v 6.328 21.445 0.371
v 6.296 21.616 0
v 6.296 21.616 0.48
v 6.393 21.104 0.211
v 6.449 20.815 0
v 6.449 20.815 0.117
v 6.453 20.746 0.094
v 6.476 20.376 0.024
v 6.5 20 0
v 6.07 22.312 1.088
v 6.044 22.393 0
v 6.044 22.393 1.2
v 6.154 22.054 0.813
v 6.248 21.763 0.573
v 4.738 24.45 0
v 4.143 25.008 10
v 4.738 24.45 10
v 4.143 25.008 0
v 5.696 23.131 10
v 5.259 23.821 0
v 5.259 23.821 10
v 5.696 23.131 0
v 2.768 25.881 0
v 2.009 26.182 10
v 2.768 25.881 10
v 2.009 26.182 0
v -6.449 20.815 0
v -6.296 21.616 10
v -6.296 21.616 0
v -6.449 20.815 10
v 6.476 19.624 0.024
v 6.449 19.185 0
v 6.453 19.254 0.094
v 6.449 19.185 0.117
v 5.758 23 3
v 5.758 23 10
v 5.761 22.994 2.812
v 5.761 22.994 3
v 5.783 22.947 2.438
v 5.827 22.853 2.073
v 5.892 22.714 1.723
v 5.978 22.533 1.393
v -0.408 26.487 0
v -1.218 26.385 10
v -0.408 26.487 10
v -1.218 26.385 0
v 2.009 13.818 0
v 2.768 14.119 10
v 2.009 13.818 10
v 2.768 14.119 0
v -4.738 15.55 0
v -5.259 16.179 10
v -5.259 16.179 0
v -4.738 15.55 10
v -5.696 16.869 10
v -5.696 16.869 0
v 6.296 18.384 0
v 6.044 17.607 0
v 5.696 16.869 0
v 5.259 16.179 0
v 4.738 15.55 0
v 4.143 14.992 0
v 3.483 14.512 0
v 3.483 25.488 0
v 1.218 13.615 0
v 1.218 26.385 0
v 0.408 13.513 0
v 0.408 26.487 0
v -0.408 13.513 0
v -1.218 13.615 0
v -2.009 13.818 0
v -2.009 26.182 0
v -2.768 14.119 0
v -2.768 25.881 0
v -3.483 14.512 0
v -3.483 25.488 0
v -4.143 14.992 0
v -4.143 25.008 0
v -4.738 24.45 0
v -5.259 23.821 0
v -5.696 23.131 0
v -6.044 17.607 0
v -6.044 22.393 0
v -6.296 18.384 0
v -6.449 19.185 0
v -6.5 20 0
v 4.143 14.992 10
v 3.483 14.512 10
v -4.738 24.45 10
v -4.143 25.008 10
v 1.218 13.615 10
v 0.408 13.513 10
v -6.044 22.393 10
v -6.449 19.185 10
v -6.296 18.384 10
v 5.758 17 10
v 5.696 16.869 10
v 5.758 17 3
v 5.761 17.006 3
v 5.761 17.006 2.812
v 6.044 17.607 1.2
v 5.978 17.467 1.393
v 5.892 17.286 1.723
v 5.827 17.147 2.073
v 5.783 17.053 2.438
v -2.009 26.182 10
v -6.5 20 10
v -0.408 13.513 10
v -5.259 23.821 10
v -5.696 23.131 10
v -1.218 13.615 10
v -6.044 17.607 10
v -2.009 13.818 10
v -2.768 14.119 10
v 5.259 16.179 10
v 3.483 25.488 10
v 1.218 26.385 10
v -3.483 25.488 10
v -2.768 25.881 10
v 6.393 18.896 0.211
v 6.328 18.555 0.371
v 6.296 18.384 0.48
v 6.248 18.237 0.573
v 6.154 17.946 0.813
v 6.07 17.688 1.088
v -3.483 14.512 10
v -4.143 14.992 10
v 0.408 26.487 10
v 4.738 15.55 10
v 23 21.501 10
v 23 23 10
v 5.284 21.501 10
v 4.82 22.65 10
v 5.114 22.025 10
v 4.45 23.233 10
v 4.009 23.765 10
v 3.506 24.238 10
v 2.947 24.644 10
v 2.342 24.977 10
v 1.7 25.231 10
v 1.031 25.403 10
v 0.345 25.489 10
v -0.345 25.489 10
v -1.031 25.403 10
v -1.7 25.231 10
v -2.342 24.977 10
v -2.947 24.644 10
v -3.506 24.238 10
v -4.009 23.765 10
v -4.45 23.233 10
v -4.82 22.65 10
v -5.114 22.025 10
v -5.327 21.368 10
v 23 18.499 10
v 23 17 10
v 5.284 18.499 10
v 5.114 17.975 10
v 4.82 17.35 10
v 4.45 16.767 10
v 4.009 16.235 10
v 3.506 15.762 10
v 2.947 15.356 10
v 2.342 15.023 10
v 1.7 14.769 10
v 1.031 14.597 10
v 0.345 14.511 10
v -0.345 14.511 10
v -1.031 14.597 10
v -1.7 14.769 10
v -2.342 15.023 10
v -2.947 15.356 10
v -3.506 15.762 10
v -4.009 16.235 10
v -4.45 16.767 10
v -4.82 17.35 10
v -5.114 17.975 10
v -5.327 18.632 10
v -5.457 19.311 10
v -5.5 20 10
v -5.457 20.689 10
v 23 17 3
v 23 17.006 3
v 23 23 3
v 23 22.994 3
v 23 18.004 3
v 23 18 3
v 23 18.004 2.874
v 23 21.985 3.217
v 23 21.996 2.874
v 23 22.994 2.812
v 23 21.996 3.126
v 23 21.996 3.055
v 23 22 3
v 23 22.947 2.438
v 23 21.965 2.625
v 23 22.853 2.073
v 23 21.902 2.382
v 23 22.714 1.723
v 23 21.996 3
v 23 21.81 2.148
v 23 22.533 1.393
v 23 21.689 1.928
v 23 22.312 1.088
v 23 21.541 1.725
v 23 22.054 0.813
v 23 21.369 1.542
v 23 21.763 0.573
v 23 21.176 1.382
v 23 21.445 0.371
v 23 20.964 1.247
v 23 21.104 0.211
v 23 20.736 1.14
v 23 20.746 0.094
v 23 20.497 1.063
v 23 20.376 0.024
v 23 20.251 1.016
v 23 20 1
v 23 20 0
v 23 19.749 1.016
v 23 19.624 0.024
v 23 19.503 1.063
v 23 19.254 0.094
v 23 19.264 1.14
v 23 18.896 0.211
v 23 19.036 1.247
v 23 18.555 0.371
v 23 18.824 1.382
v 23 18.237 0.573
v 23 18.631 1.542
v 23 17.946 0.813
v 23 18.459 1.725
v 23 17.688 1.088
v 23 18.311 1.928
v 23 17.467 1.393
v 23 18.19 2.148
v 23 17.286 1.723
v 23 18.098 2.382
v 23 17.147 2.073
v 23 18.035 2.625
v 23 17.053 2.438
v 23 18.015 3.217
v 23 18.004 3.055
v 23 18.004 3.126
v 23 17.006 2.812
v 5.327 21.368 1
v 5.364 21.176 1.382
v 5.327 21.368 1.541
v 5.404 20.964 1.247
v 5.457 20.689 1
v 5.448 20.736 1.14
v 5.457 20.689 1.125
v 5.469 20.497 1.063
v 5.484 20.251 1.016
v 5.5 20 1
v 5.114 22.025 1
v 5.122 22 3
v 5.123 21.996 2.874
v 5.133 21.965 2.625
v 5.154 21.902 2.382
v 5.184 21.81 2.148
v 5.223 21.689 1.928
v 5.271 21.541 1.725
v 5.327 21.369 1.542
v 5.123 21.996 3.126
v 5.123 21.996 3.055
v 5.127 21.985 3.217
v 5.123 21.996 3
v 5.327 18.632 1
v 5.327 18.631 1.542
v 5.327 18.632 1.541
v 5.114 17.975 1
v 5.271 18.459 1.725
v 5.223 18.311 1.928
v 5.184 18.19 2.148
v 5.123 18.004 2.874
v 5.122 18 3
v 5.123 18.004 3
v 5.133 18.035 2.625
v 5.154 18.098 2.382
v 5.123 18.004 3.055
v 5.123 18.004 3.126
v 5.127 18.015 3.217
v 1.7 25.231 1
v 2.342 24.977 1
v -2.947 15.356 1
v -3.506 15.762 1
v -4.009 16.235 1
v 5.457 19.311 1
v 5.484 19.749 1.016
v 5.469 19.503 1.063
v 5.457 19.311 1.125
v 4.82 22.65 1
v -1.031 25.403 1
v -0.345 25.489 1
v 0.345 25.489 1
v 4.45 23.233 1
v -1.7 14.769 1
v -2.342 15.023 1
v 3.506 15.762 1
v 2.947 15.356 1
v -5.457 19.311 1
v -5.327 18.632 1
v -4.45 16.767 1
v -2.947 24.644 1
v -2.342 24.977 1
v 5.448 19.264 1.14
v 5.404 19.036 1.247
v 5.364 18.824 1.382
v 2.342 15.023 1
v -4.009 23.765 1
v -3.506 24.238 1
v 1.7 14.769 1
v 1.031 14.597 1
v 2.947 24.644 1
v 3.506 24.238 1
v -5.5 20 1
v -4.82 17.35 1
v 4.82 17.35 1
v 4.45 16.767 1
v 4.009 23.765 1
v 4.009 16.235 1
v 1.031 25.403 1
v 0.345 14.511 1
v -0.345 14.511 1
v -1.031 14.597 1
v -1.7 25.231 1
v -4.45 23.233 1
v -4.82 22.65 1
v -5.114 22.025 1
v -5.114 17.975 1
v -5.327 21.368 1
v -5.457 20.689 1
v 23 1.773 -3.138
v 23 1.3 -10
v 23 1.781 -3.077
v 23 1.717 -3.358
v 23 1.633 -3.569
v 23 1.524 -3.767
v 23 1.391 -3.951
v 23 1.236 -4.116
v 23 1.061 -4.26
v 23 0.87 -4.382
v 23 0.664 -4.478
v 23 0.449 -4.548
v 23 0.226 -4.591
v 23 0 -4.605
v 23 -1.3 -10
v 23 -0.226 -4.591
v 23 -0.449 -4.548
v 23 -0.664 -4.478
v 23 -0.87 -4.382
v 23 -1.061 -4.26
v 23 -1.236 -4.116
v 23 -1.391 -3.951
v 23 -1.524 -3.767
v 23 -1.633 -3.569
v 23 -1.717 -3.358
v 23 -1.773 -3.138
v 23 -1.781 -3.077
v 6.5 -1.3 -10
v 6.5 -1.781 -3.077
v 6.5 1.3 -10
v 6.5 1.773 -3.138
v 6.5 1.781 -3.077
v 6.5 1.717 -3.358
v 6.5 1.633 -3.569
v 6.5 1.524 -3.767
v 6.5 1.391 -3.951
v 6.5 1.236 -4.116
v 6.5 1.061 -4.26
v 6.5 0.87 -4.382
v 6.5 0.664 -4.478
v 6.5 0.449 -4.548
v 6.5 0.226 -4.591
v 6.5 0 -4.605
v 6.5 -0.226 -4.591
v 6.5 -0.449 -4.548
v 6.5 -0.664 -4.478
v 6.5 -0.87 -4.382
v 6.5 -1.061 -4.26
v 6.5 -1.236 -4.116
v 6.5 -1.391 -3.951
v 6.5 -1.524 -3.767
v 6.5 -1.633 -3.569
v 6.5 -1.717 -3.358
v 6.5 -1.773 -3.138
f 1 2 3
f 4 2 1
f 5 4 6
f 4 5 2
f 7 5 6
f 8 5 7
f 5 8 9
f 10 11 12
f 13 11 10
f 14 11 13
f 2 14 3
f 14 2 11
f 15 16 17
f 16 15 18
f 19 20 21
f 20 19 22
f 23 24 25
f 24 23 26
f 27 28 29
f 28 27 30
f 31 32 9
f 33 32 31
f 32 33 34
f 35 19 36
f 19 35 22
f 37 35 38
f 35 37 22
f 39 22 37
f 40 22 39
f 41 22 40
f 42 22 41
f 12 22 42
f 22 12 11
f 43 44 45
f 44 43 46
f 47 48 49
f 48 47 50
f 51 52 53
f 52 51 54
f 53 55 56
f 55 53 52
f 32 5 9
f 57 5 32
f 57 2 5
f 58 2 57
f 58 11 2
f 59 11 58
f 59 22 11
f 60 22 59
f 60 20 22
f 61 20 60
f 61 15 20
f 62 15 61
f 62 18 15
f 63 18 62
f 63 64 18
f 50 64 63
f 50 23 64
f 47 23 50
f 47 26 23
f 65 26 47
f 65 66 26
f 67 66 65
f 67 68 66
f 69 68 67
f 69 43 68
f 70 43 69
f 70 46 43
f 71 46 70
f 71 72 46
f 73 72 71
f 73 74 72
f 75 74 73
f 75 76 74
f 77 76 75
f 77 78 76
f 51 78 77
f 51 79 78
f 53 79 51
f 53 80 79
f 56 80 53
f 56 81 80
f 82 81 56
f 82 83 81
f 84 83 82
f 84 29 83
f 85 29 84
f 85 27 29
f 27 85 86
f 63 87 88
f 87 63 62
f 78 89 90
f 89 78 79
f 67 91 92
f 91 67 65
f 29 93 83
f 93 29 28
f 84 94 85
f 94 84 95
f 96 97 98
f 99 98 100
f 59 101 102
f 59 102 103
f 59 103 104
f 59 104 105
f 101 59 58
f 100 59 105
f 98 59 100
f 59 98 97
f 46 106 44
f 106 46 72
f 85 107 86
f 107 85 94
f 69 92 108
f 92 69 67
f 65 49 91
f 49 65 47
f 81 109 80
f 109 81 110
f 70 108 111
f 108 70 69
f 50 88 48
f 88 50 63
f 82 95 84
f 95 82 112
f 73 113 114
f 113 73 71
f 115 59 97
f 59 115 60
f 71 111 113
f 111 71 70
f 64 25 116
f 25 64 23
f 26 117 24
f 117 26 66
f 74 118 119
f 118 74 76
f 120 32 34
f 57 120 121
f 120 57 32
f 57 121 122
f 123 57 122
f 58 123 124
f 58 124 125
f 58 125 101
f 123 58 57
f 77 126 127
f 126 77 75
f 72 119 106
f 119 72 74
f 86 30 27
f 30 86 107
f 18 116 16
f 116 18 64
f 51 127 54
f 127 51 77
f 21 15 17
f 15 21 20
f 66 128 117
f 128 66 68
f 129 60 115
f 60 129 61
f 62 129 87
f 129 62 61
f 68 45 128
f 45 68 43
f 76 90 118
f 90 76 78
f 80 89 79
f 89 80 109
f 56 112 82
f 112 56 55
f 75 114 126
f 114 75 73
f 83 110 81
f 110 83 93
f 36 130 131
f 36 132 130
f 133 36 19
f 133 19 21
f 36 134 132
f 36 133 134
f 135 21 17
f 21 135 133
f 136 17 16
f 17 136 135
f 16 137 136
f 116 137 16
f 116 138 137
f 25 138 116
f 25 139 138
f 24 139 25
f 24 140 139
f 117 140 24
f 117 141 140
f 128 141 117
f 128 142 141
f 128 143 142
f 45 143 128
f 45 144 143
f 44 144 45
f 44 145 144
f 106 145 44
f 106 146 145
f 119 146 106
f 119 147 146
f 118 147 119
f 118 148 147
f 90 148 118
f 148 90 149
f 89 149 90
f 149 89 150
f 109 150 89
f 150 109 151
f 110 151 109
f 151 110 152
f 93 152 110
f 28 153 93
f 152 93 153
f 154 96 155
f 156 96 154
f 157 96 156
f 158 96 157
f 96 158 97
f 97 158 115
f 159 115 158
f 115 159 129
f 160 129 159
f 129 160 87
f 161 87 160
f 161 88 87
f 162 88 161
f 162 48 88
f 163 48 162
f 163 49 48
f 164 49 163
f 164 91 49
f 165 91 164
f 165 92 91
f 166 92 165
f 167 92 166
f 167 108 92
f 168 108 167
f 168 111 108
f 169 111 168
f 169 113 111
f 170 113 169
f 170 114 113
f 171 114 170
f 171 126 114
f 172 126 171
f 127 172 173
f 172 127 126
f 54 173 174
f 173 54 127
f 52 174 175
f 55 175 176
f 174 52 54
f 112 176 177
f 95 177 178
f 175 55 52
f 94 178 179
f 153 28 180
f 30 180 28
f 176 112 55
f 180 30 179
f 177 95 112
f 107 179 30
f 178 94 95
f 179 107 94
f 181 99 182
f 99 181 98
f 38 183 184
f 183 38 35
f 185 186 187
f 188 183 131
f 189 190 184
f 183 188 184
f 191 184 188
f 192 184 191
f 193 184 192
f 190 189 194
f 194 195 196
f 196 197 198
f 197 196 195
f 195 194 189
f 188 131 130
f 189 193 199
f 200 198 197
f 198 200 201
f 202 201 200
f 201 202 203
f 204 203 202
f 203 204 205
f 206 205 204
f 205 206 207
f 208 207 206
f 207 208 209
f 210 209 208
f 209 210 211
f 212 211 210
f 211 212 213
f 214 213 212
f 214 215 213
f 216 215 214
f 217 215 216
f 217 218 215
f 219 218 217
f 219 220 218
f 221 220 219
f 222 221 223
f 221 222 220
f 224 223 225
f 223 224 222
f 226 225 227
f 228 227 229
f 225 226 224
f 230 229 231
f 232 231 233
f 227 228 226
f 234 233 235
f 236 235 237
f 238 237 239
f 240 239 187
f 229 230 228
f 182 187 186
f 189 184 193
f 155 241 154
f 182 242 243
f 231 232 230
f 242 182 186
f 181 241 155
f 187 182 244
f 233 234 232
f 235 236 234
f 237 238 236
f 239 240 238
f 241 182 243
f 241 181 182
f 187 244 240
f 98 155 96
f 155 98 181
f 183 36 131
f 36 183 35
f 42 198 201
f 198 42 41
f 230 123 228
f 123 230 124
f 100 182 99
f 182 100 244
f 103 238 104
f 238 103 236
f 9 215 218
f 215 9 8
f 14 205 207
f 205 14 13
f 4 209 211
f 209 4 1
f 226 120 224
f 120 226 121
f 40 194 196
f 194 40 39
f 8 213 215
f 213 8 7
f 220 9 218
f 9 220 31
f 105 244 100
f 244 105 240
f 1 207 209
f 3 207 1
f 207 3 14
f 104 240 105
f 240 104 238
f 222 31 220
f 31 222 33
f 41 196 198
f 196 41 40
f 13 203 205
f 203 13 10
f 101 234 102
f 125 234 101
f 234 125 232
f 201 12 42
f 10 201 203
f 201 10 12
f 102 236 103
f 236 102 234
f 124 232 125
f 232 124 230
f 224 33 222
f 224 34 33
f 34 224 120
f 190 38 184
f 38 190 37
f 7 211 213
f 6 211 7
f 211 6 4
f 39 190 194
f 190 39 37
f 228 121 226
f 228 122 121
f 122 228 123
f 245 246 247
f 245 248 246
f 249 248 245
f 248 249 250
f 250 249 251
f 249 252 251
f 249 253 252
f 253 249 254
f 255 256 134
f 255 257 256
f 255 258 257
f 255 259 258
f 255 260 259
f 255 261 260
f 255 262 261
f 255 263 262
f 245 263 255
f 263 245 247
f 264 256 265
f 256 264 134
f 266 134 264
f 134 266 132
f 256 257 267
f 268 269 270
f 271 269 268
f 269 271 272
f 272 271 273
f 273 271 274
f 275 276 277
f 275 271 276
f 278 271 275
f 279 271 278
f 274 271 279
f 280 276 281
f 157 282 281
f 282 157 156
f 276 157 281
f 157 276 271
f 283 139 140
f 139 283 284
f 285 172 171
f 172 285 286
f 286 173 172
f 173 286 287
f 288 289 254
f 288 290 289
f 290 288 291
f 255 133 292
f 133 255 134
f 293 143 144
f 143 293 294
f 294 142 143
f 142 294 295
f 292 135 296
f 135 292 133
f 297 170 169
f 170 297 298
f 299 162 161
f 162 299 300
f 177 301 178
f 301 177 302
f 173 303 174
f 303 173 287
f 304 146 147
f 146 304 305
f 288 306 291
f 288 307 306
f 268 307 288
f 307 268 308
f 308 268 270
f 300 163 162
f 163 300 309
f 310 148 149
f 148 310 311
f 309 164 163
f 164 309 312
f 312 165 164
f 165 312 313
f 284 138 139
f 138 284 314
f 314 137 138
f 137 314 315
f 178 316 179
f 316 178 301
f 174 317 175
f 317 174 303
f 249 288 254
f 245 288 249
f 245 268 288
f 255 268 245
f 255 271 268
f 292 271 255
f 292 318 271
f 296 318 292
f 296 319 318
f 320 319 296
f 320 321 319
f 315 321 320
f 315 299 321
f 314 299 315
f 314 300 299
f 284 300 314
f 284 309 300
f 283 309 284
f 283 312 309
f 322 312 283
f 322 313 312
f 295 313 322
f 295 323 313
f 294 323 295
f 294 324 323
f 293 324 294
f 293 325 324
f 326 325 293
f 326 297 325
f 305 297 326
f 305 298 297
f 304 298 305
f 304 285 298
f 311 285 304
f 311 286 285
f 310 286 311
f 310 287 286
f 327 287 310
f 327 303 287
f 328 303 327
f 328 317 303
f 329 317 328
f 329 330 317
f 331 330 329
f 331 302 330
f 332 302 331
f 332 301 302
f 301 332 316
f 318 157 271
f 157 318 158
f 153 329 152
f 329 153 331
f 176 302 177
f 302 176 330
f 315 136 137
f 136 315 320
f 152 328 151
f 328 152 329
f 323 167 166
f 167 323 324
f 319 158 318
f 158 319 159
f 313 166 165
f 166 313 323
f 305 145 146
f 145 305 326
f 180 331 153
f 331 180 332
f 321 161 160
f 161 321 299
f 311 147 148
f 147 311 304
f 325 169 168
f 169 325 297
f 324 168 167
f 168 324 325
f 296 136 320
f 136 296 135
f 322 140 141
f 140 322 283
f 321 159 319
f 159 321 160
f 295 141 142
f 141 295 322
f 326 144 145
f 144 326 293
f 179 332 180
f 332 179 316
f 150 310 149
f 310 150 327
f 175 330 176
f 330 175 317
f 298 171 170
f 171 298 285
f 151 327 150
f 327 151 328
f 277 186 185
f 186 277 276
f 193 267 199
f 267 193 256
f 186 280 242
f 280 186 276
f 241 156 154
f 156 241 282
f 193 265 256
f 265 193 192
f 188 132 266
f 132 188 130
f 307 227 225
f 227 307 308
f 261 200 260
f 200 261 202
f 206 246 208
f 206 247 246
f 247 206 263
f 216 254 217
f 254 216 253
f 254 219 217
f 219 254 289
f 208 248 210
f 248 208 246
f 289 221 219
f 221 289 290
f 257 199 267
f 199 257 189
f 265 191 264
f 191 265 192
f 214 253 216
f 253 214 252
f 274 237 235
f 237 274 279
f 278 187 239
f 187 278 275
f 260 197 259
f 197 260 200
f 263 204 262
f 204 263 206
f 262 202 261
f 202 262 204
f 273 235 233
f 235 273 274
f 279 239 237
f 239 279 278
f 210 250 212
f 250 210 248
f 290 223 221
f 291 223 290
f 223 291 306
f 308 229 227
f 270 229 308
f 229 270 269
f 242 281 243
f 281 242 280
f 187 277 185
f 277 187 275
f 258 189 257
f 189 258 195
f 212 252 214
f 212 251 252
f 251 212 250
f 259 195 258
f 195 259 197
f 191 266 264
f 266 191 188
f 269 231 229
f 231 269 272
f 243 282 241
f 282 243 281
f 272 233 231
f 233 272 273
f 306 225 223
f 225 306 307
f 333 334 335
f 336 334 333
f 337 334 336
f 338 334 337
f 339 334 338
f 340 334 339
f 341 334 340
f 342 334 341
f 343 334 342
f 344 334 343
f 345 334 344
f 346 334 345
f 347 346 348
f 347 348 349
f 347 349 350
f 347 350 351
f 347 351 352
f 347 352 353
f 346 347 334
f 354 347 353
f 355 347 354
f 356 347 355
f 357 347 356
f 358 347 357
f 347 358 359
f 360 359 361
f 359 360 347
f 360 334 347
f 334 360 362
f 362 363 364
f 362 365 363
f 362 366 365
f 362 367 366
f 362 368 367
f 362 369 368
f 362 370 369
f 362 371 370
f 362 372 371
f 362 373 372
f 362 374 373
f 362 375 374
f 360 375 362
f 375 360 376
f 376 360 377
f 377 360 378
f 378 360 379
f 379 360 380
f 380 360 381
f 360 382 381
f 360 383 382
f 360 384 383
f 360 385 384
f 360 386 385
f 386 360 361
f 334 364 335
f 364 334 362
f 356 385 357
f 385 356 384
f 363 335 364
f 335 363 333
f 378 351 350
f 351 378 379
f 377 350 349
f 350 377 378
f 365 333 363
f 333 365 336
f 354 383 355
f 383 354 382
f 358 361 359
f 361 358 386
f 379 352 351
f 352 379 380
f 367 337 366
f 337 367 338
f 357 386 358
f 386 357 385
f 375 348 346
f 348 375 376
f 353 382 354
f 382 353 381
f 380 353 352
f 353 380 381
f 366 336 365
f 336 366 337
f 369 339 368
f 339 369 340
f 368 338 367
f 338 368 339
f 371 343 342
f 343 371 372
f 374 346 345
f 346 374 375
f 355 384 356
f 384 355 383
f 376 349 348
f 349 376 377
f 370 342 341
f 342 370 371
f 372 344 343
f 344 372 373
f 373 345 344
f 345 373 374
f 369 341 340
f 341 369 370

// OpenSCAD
// This work is licensed under a Creative Commons Attribution-ShareAlike 4.0 International License (http://creativecommons.org/licenses/by-sa/4.0/)

$fn = 50;
eps = 0.01;

mic_diameter = 11;
mic_height = 9;
cable_diameter = 4;
wall_thickness = 1;

module trap(w, d1, d2, h) {
    delta = (d1 - d2)/2;
    echo("w, ", w, "d1", d1, "d2", d2, "h", h);
    polyhedron(points = [[0, 0, 0], [w, 0, 0], [w, d1, 0], [0, d1, 0], 
    [0, delta, h], [w, delta, h], [w, delta + d2, h], [0, delta + d2, h]],
    faces = [ [0,1,2,3], [4,5,1,0], [7,6,5,4], [5,6,2,1], [6,7,3,2], [7,4,0,3] ]);
}
module mic_box(h, d, w, l, w2) {
    if (w2 == undef) {
        mic_box_int(h, d, w, l, w);
    } else {
        mic_box_int(h, d, w, l, w2);
    }
}

module mic_box_int(h, d, w, l, w2) {
    echo("w", w, "w2", w2);
    union() {
        cylinder(d = d, h = h);
        translate([0, -w/2, w/2]) trap(l + d/2, d1 = w, d2 = w2, h = h - w/2);
        translate([0, 0, w/2]) rotate([0, 90, 0]) cylinder(d = w, h = l + d/2);
    }
}

module mic_box_(h, d, w, l, w2) {
    echo("w", w, "w2", w2);
    difference() {
        translate([d/2, -w/2, w/2]) trap(l, d1 = w, d2 = w2, h = h - w/2);
        translate([d/2 - eps, 0, w/2]) rotate([0, 90, 0]) cylinder(d = w + eps, h = l + 2 * eps);
    }
}

translate([0, 20, 0]) 
difference() {
    mic_box(h = mic_height + wall_thickness, d = mic_diameter + 2 * wall_thickness, l = mic_diameter * 1.5, w = cable_diameter + 2 * wall_thickness);
    translate([0, 0, wall_thickness]) mic_box(h = mic_height + eps, d = mic_diameter, l = mic_diameter * 1.5 + wall_thickness + eps, w = cable_diameter, w2 = cable_diameter - 1);
}

mirror([0, 0, 1])
translate([0, 0, wall_thickness]) 
mic_box_(h = mic_height, d = mic_diameter + 2 * wall_thickness, l = mic_diameter * 1.5, w = cable_diameter - 0.4, w2 = cable_diameter - 1- 0.4);
